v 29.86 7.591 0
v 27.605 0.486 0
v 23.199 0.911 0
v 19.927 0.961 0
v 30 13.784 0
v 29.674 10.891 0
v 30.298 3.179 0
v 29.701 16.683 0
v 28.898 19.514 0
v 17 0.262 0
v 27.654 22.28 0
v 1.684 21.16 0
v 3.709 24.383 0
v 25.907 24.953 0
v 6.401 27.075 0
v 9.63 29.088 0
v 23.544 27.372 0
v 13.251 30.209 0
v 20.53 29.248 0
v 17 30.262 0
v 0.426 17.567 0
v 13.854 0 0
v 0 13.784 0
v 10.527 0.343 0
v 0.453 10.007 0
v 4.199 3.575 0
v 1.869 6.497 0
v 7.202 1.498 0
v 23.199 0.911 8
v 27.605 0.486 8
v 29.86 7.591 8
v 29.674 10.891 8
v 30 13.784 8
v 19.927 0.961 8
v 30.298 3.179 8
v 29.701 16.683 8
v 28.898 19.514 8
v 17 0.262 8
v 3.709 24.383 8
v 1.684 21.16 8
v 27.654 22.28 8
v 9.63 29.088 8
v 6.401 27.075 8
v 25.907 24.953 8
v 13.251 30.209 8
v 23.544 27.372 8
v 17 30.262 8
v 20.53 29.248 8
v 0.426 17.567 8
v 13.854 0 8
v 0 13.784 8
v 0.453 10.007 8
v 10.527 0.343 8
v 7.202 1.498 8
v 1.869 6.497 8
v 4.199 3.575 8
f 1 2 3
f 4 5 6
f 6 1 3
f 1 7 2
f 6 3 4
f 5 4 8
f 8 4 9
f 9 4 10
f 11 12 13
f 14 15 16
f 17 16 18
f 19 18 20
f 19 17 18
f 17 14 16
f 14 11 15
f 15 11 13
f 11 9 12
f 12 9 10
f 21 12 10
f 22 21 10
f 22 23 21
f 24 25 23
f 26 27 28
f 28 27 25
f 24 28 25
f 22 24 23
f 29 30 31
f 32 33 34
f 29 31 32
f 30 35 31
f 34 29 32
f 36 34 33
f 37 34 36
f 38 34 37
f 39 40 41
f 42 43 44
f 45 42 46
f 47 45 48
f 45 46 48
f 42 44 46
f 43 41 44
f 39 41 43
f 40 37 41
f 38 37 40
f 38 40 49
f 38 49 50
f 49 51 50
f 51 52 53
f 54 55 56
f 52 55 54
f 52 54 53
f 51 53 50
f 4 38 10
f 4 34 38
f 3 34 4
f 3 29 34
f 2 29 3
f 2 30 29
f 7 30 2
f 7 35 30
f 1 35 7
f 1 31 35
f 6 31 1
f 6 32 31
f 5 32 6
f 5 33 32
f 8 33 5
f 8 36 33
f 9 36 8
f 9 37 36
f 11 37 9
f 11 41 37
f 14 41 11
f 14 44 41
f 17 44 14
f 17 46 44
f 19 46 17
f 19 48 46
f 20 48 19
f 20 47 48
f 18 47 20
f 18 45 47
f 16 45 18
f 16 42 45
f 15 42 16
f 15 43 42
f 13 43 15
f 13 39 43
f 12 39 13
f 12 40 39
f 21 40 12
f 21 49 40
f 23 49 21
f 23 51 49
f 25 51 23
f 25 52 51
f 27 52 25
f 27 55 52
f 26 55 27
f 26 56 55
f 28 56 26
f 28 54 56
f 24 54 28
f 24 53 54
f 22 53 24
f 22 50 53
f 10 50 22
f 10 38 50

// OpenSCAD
$fn = 32;

// ----------------------------------------------------------------------
// Cam disc: base radius 13.0 mm, lift 4.0 mm, 28 profile points
// ----------------------------------------------------------------------

// --- parameters (mm) ---
profile_height = 8;       // extrusion height
profile_points = 28;      // points of the closed outline

profile = [[30, 13.784], [29.701, 16.683], [28.898, 19.514], [27.654, 22.28], [25.907, 24.953], [23.544, 27.372], [20.53, 29.248], [17, 30.262], [13.251, 30.209], [9.63, 29.088], [6.401, 27.075], [3.709, 24.383], [1.684, 21.16], [0.426, 17.567], [0, 13.784], [0.453, 10.007], [1.869, 6.497], [4.199, 3.575], [7.202, 1.498], [10.527, 0.343], [13.854, 0], [17, 0.262], [19.927, 0.961], [23.199, 0.911], [27.605, 0.486], [30.298, 3.179], [29.86, 7.591], [29.674, 10.891]];  // single closed polygon, 28 points, counter clockwise

// --- the one profile operation ---
linear_extrude(height = profile_height) polygon(points = profile);
